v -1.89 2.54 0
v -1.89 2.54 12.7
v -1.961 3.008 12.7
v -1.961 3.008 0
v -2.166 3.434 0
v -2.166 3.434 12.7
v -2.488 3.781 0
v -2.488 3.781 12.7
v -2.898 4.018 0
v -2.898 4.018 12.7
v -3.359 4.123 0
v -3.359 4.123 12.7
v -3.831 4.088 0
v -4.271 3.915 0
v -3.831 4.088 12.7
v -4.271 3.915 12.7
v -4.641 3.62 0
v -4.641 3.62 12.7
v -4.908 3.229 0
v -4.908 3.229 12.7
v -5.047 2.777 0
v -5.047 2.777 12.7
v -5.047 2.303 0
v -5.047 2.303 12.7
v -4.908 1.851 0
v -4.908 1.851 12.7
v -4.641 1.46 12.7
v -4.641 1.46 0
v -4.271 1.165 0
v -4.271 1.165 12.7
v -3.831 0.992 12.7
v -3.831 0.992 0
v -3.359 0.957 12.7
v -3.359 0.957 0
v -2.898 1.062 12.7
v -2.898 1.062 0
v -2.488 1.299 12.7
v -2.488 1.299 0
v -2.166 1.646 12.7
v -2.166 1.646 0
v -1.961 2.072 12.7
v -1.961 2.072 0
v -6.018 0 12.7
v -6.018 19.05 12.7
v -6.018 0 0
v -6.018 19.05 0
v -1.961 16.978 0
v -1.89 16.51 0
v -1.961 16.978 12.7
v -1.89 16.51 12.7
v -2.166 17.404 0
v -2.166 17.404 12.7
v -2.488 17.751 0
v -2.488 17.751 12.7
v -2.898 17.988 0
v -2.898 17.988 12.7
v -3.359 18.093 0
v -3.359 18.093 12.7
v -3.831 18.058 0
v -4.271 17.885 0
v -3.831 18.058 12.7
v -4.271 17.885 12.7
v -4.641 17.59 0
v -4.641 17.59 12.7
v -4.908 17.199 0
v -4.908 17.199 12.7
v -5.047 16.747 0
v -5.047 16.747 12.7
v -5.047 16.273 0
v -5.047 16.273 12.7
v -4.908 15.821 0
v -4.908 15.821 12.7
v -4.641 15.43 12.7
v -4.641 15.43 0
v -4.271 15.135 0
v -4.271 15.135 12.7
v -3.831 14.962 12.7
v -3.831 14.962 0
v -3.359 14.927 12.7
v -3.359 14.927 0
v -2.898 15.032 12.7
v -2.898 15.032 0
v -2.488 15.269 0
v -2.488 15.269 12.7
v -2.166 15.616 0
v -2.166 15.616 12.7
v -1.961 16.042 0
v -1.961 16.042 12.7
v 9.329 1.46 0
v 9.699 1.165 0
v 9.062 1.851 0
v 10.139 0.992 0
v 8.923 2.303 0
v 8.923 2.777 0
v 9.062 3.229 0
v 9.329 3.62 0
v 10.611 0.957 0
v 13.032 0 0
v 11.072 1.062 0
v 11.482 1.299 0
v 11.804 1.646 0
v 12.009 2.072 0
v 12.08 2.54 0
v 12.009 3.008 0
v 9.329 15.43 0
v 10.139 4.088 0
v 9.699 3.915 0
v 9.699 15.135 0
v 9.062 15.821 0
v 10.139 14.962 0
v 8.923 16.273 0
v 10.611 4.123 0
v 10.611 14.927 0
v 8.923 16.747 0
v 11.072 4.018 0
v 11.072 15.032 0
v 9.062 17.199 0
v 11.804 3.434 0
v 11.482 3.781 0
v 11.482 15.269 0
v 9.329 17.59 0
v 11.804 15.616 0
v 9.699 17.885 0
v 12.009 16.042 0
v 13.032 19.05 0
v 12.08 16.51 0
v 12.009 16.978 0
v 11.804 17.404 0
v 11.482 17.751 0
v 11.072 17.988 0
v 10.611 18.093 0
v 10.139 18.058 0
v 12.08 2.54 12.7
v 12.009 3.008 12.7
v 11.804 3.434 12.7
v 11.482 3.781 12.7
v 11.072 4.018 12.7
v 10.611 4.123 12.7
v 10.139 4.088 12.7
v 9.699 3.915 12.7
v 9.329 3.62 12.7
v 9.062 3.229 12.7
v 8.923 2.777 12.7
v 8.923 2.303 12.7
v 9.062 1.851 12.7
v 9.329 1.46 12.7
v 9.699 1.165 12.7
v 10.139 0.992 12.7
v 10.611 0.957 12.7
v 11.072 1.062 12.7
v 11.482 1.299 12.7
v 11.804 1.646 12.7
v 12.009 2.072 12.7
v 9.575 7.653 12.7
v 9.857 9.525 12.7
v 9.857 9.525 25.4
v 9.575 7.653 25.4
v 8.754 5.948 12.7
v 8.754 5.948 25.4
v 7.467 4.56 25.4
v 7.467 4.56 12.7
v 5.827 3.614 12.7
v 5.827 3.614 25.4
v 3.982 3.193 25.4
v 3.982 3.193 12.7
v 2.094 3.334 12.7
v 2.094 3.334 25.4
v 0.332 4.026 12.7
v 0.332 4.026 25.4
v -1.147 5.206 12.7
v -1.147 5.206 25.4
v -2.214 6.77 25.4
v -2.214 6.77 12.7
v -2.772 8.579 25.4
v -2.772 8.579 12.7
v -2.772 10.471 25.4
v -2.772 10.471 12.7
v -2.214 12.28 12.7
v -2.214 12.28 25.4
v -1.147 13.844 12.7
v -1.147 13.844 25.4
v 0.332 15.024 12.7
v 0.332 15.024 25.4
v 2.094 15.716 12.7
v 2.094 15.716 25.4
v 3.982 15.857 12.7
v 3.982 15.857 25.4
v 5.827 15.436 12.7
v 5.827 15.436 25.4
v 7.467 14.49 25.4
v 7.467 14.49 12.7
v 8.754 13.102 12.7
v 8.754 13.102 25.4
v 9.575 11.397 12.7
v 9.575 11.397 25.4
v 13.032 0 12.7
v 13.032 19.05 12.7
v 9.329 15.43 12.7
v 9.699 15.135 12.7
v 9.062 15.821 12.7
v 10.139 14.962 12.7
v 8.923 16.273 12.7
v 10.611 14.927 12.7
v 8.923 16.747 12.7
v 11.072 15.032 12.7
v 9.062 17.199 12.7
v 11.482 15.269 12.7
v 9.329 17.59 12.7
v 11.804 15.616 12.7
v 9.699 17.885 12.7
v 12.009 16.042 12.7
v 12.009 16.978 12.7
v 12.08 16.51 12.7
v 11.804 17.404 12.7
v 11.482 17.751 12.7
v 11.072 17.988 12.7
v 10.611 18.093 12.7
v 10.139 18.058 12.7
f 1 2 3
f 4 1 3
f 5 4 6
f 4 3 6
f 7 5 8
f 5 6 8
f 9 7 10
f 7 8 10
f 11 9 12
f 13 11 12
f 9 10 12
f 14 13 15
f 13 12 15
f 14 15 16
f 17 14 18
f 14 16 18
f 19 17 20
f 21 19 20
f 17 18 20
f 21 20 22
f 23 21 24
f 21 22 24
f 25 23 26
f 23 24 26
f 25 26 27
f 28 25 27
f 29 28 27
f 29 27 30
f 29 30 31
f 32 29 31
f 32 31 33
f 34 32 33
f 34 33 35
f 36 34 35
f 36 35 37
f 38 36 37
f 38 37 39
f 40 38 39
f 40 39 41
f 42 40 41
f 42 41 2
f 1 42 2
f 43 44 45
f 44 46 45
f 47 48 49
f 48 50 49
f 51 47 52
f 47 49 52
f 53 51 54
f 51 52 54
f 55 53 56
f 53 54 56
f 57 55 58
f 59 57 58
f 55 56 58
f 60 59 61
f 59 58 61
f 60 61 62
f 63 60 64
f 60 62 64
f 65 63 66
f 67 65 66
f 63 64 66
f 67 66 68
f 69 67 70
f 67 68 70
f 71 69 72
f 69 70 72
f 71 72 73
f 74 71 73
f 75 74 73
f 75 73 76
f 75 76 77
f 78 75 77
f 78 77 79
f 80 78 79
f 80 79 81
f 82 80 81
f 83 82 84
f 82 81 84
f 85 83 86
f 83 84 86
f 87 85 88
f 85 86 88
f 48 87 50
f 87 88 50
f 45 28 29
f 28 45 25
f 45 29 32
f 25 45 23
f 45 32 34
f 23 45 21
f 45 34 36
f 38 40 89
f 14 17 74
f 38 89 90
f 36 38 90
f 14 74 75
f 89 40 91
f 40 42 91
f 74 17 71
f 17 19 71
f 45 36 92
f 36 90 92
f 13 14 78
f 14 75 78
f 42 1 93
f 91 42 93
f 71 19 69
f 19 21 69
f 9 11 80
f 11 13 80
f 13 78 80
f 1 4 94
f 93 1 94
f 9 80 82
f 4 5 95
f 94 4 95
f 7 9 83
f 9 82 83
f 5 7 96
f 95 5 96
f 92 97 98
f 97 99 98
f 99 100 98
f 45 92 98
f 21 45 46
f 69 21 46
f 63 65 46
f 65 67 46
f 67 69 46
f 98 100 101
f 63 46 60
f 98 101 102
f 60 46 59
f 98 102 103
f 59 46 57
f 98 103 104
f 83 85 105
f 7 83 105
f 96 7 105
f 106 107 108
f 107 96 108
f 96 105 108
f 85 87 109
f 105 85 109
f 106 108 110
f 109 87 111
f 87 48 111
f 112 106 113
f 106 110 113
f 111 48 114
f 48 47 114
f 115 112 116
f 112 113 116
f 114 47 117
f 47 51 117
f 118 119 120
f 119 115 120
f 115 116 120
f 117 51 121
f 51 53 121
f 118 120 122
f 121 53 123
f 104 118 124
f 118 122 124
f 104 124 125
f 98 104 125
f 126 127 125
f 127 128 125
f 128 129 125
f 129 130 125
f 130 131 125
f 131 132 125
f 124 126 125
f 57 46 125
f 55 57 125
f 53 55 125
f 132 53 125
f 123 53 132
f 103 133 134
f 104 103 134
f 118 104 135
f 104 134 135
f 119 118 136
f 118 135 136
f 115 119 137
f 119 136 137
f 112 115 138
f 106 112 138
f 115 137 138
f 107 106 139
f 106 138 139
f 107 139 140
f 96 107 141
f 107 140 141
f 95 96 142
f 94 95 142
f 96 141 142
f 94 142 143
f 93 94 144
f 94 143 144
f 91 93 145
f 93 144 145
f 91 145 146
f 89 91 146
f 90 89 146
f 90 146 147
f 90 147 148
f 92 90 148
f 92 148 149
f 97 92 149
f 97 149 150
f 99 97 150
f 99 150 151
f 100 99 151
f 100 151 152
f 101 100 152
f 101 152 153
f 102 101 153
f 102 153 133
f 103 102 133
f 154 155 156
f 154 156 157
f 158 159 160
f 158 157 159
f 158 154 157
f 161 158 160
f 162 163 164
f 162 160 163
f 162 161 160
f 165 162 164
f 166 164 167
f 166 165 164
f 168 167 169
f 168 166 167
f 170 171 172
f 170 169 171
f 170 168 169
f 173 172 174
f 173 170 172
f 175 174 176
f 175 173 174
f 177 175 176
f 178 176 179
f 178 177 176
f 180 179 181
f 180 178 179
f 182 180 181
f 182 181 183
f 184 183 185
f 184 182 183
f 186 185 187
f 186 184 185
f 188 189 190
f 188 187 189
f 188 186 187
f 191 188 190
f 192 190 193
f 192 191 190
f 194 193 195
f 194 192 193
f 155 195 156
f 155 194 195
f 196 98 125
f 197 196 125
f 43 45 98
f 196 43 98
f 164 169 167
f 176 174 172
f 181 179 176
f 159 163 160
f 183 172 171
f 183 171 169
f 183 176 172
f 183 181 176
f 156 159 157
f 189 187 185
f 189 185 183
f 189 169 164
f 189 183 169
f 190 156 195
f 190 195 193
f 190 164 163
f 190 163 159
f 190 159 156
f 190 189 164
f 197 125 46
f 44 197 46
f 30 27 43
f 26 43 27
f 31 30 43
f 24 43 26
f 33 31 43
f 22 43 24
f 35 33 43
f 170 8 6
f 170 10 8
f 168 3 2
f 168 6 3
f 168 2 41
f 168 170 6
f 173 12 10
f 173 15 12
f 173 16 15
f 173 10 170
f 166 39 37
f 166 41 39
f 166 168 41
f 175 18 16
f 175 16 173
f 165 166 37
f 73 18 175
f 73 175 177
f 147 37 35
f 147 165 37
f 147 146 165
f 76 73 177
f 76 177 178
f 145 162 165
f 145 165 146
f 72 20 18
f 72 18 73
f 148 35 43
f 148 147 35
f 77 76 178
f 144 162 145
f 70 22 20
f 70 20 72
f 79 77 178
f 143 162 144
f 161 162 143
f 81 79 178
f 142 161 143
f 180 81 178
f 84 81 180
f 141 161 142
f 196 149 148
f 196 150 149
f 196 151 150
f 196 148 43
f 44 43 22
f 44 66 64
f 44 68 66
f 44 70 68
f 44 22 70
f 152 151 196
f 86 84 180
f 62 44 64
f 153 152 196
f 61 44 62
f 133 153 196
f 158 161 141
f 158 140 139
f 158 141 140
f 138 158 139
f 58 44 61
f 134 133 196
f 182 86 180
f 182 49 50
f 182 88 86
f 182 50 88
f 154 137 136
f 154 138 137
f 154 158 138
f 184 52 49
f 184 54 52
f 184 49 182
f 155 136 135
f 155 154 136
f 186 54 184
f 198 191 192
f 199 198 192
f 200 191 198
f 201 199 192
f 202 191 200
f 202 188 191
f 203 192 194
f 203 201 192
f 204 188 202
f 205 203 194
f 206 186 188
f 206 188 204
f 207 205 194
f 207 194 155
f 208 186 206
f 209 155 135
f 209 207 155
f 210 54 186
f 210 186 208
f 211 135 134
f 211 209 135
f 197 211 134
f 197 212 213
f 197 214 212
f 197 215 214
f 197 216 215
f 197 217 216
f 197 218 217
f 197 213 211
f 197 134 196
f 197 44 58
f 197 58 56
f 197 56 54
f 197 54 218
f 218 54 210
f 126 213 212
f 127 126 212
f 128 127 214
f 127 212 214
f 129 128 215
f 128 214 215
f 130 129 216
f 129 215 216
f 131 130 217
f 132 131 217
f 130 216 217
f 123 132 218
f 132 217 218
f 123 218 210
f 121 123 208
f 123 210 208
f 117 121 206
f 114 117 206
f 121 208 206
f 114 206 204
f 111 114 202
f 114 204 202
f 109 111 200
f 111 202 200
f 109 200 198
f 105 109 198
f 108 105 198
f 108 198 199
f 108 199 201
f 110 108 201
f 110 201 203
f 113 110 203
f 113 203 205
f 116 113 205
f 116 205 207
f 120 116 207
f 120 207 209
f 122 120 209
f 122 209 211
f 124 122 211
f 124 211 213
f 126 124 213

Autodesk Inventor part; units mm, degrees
ref_plane "YZ Plane" through (0, 0, 0) normal (1, 0, 0) x (0, 1, 0)
ref_plane "XZ Plane" through (0, 0, 0) normal (0, 1, 0) x (-1, 0, 0)
ref_plane "XY Plane" through (0, 0, 0) normal (0, 0, 1) x (1, 0, 0)
sketch "Sketch1" plane through (0, 0, 0) normal (0, 0, 1) x (1, 0, 0)
  line L0 (-6.0176, 0) -> (13.0324, 0)
  line L1 (13.0324, 0) -> (13.0324, 19.05)
  line L2 (13.0324, 19.05) -> (-6.0176, 19.05)
  line L3 (-6.0176, 19.05) -> (-6.0176, 0)
  point P0 (0, 0)
  dimension "d0" = 19.05
  dimension "d1" = 19.05
extrude "Extrusion1" add sketch "Sketch1" along normal blind 12.7
sketch "Sketch2" plane through (0, 0, 12.7) normal (0, 0, 1) x (1, 0, 0)
  circle A0 centre (3.5074, 9.525) radius 6.35
  line L0 (13.0324, 19.05) -> (-6.0176, 19.05) projected
  line L1 (13.0324, 0) -> (13.0324, 19.05) projected
  circle A1 centre (10.4924, 16.51) radius 1.5875
  circle A2 centre (10.4924, 2.54) radius 1.5875
  line L2 (-6.0176, 0) -> (13.0324, 0) projected
  circle A3 centre (-3.4776, 16.51) radius 1.5875
  line L3 (-6.0176, 19.05) -> (-6.0176, 0) projected
  circle A4 centre (-3.4776, 2.54) radius 1.5875
  point P0 (0, 0)
  dimension "d4" = 9.525
  dimension "d5" = 9.525
  dimension "d6" = 12.7
  dimension "d9" = 3.175
  dimension "d10" = 2.54
  dimension "d11" = 2.54
  dimension "d12" = 3.175
  dimension "d13" = 2.54
  dimension "d14" = 2.54
  dimension "d15" = 3.175
  dimension "d16" = 2.54
  dimension "d17" = 2.54
  dimension "d18" = 3.175
  dimension "d19" = 2.54
  dimension "d20" = 2.54
extrude "Extrusion2" add sketch "Sketch2" along normal blind 12.7 contours A0
sketch "Sketch3" plane through (0, 0, 12.7) normal (0, 0, 1) x (1, 0, 0)
  circle A0 centre (10.4924, 16.51) radius 1.5875
  circle A1 centre (-3.4776, 16.51) radius 1.5875
  circle A2 centre (-3.4776, 2.54) radius 1.5875
  circle A3 centre (10.4924, 2.54) radius 1.5875
  line L0 (-6.0176, 0) -> (13.0324, 0) projected
  line L1 (-6.0176, 19.05) -> (-6.0176, 0) projected
  line L2 (13.0324, 19.05) -> (-6.0176, 19.05) projected
  line L3 (13.0324, 0) -> (13.0324, 19.05) projected
  point P0 (0, 0)
  dimension "d21" = 3.175
  dimension "d22" = 3.175
  dimension "d23" = 3.175
  dimension "d24" = 3.175
  dimension "d25" = 2.54
  dimension "d26" = 2.54
  dimension "d27" = 2.54
  dimension "d28" = 2.54
  dimension "d29" = 2.54
  dimension "d30" = 2.54
  dimension "d31" = 2.54
  dimension "d32" = 2.54
extrude "Extrusion3" cut sketch "Sketch3" against normal blind 12.7 contours A0 | A1 | A2 | A3
properties part number "bottom piece pvc"
